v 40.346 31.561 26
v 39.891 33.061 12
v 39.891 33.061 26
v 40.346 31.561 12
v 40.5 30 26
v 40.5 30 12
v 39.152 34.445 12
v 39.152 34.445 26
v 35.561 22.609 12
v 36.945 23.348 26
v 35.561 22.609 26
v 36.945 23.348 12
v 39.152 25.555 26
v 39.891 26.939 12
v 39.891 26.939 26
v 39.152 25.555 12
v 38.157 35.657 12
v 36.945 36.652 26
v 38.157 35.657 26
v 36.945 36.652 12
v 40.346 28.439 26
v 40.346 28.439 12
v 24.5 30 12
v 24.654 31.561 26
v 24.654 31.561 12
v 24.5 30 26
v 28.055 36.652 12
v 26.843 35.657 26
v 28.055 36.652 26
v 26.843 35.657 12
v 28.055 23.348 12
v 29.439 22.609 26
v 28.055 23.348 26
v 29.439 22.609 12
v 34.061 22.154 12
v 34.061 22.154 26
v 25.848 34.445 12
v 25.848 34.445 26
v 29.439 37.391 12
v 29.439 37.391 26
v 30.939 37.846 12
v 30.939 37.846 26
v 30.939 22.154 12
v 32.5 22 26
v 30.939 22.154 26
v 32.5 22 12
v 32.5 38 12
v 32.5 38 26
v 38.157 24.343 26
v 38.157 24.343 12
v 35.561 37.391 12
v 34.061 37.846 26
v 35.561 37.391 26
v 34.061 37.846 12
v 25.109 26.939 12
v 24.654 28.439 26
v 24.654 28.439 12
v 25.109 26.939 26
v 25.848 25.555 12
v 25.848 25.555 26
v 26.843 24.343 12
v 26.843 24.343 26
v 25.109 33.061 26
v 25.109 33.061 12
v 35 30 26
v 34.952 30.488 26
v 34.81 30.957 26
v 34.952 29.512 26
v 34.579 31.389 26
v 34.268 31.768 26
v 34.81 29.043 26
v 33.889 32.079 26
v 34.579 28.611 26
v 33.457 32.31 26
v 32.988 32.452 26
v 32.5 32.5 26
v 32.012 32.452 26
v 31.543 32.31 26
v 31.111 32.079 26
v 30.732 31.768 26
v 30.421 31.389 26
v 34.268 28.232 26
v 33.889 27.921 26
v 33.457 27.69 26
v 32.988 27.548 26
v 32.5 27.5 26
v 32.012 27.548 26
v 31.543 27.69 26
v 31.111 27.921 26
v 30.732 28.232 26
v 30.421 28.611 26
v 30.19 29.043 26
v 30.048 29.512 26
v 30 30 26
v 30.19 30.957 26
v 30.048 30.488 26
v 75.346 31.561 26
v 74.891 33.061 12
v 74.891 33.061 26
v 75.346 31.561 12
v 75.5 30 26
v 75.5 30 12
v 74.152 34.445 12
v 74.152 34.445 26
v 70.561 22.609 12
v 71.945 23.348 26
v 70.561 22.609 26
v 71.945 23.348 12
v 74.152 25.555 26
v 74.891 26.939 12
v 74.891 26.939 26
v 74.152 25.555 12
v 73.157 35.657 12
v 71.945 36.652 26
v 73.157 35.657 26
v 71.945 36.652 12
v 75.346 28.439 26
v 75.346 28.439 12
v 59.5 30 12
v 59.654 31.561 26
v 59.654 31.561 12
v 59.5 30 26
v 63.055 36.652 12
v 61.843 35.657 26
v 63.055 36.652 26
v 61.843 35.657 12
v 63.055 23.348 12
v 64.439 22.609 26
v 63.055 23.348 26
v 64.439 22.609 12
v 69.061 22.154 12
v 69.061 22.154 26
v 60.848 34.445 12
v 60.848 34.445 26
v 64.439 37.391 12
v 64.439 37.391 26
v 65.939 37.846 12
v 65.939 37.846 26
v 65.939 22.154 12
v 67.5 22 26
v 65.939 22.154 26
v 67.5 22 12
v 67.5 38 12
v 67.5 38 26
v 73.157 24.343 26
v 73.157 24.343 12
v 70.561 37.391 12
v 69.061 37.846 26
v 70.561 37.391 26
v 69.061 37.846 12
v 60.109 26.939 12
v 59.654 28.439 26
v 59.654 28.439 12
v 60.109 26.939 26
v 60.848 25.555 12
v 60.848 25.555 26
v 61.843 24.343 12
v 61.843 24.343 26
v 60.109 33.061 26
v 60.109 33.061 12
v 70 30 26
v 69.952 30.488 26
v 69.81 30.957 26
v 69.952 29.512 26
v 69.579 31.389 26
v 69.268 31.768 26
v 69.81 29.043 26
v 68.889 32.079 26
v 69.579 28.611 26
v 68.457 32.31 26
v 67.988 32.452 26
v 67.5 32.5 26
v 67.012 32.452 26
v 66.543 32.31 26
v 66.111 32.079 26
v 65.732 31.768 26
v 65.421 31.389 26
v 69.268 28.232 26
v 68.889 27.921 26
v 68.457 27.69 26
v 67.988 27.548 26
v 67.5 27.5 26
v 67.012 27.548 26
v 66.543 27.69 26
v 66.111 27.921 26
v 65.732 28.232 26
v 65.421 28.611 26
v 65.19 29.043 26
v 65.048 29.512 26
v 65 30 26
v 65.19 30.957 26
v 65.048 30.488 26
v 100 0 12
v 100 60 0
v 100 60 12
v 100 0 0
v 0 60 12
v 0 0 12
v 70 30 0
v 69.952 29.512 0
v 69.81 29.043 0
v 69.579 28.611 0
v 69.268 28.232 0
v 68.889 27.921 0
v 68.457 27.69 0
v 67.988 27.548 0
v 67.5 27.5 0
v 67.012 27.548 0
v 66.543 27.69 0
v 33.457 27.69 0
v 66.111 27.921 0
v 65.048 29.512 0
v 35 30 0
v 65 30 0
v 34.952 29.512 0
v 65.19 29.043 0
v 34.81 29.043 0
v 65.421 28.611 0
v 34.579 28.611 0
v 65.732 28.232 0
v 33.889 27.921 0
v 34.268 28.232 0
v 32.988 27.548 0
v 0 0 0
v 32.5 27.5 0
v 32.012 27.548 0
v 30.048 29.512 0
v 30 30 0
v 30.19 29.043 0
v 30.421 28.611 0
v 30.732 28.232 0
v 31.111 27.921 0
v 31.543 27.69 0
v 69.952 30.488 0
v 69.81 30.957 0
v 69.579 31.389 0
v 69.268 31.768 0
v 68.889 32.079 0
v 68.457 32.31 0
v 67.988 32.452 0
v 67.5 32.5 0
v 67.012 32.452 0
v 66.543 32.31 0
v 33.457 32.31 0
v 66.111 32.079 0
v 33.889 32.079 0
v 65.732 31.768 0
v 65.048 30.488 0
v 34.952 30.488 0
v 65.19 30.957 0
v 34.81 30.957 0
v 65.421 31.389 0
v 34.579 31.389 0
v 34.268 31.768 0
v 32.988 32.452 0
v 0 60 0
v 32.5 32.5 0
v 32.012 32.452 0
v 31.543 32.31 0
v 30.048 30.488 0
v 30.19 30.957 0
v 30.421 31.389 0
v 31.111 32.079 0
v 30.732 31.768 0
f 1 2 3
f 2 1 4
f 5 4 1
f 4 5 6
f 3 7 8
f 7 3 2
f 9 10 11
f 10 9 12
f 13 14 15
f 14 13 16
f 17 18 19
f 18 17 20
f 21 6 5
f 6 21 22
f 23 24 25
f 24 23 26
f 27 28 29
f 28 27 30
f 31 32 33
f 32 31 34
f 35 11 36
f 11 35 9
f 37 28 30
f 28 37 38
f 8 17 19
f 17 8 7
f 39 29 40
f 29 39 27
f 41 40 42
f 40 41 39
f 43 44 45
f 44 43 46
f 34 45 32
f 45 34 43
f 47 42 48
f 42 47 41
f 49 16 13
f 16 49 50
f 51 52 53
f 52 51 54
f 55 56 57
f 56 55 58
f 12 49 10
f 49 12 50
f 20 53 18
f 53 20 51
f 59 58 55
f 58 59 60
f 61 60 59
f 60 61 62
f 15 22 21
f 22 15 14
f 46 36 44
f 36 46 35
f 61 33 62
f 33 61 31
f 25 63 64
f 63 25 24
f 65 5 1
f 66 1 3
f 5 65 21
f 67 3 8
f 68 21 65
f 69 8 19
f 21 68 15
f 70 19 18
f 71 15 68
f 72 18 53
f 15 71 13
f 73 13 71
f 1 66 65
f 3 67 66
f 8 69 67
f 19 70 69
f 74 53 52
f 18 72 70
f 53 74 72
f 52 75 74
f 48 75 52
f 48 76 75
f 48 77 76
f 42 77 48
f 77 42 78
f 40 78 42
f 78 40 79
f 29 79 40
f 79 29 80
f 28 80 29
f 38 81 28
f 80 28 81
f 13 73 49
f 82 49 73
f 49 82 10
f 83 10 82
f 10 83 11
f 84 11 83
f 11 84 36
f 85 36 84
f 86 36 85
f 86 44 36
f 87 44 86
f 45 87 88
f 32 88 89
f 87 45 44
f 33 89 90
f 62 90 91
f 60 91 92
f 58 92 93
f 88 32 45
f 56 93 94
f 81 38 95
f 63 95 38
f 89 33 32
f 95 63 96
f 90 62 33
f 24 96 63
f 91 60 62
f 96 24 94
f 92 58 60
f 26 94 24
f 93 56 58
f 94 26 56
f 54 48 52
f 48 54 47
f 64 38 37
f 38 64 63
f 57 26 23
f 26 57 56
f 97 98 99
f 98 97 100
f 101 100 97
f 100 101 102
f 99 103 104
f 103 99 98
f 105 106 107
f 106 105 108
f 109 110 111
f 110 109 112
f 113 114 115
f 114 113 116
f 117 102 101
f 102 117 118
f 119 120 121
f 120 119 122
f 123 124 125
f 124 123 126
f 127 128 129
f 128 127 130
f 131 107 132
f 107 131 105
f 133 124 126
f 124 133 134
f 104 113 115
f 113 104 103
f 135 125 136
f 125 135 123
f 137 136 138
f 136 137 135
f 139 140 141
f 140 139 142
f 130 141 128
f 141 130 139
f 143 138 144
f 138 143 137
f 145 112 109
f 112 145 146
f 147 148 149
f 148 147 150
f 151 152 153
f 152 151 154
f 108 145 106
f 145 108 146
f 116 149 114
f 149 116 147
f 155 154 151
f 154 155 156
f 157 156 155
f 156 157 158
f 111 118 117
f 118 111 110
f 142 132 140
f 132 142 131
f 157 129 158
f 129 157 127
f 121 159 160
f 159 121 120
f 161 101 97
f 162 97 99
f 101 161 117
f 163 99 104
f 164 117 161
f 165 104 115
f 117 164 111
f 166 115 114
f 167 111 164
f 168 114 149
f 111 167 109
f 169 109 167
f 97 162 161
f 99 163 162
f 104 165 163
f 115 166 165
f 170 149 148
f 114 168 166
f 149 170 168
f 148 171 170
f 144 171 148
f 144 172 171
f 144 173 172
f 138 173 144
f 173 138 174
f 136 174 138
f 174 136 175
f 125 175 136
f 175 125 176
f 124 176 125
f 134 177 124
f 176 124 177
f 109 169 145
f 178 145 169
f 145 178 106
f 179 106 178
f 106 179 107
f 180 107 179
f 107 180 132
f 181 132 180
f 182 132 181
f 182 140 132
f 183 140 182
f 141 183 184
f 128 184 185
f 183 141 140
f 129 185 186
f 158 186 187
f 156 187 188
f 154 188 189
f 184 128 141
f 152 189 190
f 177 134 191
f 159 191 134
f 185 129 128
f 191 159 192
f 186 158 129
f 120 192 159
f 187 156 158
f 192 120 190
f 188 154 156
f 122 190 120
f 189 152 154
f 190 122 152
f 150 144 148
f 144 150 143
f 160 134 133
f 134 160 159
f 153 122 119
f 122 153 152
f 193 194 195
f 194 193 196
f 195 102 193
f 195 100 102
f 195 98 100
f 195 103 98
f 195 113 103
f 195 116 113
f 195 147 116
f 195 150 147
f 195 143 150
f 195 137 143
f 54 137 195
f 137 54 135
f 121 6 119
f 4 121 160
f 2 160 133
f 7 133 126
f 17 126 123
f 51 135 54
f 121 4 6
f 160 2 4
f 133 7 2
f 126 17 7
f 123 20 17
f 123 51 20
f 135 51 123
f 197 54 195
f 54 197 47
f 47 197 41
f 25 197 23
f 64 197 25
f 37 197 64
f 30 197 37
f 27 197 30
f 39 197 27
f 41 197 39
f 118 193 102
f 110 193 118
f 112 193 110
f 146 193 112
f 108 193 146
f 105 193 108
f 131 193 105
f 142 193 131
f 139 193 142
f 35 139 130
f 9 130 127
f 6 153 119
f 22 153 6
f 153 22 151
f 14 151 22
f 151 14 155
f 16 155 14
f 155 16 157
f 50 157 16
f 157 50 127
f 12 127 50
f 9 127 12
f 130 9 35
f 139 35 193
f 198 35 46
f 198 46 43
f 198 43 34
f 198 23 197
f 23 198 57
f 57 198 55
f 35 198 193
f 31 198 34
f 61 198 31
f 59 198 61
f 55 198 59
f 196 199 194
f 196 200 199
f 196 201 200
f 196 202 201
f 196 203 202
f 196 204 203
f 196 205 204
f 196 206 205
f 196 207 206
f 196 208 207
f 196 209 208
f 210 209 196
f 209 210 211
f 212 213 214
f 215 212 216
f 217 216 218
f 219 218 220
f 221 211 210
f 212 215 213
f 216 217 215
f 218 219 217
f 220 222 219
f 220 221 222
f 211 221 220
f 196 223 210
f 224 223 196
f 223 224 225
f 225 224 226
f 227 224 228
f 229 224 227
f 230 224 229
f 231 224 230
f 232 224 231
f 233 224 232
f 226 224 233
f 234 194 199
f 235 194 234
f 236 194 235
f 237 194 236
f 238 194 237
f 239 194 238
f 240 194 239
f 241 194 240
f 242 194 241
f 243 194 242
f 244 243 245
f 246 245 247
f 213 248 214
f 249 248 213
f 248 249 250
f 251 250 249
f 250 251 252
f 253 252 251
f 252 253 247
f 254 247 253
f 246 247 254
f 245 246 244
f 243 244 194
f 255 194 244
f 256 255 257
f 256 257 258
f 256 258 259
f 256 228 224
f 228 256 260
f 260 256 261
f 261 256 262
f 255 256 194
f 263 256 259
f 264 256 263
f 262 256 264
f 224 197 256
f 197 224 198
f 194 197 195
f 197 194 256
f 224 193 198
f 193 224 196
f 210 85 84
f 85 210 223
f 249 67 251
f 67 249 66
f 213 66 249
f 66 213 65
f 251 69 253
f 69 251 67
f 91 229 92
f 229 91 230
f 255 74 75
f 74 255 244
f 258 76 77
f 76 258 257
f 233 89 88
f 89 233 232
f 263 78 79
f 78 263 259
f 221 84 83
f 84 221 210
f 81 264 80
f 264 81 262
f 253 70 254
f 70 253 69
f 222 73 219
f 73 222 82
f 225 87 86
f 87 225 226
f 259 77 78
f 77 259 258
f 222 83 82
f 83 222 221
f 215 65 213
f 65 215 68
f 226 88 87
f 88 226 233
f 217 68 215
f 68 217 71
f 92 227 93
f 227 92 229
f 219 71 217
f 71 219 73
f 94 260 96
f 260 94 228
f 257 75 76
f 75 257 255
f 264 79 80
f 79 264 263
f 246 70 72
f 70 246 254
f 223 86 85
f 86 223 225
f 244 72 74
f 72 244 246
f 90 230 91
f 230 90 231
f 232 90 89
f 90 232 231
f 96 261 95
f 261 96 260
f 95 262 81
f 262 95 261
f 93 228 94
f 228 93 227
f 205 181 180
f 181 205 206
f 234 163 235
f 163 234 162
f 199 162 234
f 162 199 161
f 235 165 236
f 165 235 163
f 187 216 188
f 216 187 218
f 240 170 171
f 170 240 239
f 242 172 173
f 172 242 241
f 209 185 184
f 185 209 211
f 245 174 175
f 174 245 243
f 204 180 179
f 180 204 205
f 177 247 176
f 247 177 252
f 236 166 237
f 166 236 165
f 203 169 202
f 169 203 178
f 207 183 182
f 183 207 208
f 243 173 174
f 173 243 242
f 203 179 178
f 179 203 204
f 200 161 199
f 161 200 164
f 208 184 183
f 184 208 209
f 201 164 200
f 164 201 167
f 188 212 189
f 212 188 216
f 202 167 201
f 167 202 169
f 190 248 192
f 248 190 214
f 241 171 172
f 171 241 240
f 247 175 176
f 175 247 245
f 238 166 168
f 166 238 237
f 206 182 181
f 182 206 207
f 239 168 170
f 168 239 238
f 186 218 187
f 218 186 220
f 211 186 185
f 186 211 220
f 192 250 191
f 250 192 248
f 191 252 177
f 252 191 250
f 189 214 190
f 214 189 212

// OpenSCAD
$fn = 32;

// ----------------------------------------------------------------------
// Drill jig: two_boss jig
// ----------------------------------------------------------------------

// --- parameters (mm) ---
plate_l = 100;            // plate length, X
plate_w = 60;             // plate width, Y
plate_t = 12;             // plate thickness
boss_d = 16;              // guide boss diameter
boss_h = 15;              // boss height above the plate
guide_d = 5;              // guide hole diameter
boss_pitch = 35;          // boss pitch

n_boss = 2;  // guide bosses
boss_x0 = (plate_l - (n_boss - 1) * boss_pitch) / 2;  // first boss X
boss_top = plate_t - 1 + boss_h;  // boss crown height
total_h = boss_top;  // overall height

difference() {
  union() {
  cube([plate_l, plate_w, plate_t]);
  for (i = [0 : n_boss - 1])
    translate([boss_x0 + i * boss_pitch, plate_w / 2, plate_t - 1])
      cylinder(h = boss_h, d = boss_d);
  }
  for (i = [0 : n_boss - 1])
    translate([boss_x0 + i * boss_pitch, plate_w / 2, -1])
      cylinder(h = plate_t + boss_h, d = guide_d);
}
